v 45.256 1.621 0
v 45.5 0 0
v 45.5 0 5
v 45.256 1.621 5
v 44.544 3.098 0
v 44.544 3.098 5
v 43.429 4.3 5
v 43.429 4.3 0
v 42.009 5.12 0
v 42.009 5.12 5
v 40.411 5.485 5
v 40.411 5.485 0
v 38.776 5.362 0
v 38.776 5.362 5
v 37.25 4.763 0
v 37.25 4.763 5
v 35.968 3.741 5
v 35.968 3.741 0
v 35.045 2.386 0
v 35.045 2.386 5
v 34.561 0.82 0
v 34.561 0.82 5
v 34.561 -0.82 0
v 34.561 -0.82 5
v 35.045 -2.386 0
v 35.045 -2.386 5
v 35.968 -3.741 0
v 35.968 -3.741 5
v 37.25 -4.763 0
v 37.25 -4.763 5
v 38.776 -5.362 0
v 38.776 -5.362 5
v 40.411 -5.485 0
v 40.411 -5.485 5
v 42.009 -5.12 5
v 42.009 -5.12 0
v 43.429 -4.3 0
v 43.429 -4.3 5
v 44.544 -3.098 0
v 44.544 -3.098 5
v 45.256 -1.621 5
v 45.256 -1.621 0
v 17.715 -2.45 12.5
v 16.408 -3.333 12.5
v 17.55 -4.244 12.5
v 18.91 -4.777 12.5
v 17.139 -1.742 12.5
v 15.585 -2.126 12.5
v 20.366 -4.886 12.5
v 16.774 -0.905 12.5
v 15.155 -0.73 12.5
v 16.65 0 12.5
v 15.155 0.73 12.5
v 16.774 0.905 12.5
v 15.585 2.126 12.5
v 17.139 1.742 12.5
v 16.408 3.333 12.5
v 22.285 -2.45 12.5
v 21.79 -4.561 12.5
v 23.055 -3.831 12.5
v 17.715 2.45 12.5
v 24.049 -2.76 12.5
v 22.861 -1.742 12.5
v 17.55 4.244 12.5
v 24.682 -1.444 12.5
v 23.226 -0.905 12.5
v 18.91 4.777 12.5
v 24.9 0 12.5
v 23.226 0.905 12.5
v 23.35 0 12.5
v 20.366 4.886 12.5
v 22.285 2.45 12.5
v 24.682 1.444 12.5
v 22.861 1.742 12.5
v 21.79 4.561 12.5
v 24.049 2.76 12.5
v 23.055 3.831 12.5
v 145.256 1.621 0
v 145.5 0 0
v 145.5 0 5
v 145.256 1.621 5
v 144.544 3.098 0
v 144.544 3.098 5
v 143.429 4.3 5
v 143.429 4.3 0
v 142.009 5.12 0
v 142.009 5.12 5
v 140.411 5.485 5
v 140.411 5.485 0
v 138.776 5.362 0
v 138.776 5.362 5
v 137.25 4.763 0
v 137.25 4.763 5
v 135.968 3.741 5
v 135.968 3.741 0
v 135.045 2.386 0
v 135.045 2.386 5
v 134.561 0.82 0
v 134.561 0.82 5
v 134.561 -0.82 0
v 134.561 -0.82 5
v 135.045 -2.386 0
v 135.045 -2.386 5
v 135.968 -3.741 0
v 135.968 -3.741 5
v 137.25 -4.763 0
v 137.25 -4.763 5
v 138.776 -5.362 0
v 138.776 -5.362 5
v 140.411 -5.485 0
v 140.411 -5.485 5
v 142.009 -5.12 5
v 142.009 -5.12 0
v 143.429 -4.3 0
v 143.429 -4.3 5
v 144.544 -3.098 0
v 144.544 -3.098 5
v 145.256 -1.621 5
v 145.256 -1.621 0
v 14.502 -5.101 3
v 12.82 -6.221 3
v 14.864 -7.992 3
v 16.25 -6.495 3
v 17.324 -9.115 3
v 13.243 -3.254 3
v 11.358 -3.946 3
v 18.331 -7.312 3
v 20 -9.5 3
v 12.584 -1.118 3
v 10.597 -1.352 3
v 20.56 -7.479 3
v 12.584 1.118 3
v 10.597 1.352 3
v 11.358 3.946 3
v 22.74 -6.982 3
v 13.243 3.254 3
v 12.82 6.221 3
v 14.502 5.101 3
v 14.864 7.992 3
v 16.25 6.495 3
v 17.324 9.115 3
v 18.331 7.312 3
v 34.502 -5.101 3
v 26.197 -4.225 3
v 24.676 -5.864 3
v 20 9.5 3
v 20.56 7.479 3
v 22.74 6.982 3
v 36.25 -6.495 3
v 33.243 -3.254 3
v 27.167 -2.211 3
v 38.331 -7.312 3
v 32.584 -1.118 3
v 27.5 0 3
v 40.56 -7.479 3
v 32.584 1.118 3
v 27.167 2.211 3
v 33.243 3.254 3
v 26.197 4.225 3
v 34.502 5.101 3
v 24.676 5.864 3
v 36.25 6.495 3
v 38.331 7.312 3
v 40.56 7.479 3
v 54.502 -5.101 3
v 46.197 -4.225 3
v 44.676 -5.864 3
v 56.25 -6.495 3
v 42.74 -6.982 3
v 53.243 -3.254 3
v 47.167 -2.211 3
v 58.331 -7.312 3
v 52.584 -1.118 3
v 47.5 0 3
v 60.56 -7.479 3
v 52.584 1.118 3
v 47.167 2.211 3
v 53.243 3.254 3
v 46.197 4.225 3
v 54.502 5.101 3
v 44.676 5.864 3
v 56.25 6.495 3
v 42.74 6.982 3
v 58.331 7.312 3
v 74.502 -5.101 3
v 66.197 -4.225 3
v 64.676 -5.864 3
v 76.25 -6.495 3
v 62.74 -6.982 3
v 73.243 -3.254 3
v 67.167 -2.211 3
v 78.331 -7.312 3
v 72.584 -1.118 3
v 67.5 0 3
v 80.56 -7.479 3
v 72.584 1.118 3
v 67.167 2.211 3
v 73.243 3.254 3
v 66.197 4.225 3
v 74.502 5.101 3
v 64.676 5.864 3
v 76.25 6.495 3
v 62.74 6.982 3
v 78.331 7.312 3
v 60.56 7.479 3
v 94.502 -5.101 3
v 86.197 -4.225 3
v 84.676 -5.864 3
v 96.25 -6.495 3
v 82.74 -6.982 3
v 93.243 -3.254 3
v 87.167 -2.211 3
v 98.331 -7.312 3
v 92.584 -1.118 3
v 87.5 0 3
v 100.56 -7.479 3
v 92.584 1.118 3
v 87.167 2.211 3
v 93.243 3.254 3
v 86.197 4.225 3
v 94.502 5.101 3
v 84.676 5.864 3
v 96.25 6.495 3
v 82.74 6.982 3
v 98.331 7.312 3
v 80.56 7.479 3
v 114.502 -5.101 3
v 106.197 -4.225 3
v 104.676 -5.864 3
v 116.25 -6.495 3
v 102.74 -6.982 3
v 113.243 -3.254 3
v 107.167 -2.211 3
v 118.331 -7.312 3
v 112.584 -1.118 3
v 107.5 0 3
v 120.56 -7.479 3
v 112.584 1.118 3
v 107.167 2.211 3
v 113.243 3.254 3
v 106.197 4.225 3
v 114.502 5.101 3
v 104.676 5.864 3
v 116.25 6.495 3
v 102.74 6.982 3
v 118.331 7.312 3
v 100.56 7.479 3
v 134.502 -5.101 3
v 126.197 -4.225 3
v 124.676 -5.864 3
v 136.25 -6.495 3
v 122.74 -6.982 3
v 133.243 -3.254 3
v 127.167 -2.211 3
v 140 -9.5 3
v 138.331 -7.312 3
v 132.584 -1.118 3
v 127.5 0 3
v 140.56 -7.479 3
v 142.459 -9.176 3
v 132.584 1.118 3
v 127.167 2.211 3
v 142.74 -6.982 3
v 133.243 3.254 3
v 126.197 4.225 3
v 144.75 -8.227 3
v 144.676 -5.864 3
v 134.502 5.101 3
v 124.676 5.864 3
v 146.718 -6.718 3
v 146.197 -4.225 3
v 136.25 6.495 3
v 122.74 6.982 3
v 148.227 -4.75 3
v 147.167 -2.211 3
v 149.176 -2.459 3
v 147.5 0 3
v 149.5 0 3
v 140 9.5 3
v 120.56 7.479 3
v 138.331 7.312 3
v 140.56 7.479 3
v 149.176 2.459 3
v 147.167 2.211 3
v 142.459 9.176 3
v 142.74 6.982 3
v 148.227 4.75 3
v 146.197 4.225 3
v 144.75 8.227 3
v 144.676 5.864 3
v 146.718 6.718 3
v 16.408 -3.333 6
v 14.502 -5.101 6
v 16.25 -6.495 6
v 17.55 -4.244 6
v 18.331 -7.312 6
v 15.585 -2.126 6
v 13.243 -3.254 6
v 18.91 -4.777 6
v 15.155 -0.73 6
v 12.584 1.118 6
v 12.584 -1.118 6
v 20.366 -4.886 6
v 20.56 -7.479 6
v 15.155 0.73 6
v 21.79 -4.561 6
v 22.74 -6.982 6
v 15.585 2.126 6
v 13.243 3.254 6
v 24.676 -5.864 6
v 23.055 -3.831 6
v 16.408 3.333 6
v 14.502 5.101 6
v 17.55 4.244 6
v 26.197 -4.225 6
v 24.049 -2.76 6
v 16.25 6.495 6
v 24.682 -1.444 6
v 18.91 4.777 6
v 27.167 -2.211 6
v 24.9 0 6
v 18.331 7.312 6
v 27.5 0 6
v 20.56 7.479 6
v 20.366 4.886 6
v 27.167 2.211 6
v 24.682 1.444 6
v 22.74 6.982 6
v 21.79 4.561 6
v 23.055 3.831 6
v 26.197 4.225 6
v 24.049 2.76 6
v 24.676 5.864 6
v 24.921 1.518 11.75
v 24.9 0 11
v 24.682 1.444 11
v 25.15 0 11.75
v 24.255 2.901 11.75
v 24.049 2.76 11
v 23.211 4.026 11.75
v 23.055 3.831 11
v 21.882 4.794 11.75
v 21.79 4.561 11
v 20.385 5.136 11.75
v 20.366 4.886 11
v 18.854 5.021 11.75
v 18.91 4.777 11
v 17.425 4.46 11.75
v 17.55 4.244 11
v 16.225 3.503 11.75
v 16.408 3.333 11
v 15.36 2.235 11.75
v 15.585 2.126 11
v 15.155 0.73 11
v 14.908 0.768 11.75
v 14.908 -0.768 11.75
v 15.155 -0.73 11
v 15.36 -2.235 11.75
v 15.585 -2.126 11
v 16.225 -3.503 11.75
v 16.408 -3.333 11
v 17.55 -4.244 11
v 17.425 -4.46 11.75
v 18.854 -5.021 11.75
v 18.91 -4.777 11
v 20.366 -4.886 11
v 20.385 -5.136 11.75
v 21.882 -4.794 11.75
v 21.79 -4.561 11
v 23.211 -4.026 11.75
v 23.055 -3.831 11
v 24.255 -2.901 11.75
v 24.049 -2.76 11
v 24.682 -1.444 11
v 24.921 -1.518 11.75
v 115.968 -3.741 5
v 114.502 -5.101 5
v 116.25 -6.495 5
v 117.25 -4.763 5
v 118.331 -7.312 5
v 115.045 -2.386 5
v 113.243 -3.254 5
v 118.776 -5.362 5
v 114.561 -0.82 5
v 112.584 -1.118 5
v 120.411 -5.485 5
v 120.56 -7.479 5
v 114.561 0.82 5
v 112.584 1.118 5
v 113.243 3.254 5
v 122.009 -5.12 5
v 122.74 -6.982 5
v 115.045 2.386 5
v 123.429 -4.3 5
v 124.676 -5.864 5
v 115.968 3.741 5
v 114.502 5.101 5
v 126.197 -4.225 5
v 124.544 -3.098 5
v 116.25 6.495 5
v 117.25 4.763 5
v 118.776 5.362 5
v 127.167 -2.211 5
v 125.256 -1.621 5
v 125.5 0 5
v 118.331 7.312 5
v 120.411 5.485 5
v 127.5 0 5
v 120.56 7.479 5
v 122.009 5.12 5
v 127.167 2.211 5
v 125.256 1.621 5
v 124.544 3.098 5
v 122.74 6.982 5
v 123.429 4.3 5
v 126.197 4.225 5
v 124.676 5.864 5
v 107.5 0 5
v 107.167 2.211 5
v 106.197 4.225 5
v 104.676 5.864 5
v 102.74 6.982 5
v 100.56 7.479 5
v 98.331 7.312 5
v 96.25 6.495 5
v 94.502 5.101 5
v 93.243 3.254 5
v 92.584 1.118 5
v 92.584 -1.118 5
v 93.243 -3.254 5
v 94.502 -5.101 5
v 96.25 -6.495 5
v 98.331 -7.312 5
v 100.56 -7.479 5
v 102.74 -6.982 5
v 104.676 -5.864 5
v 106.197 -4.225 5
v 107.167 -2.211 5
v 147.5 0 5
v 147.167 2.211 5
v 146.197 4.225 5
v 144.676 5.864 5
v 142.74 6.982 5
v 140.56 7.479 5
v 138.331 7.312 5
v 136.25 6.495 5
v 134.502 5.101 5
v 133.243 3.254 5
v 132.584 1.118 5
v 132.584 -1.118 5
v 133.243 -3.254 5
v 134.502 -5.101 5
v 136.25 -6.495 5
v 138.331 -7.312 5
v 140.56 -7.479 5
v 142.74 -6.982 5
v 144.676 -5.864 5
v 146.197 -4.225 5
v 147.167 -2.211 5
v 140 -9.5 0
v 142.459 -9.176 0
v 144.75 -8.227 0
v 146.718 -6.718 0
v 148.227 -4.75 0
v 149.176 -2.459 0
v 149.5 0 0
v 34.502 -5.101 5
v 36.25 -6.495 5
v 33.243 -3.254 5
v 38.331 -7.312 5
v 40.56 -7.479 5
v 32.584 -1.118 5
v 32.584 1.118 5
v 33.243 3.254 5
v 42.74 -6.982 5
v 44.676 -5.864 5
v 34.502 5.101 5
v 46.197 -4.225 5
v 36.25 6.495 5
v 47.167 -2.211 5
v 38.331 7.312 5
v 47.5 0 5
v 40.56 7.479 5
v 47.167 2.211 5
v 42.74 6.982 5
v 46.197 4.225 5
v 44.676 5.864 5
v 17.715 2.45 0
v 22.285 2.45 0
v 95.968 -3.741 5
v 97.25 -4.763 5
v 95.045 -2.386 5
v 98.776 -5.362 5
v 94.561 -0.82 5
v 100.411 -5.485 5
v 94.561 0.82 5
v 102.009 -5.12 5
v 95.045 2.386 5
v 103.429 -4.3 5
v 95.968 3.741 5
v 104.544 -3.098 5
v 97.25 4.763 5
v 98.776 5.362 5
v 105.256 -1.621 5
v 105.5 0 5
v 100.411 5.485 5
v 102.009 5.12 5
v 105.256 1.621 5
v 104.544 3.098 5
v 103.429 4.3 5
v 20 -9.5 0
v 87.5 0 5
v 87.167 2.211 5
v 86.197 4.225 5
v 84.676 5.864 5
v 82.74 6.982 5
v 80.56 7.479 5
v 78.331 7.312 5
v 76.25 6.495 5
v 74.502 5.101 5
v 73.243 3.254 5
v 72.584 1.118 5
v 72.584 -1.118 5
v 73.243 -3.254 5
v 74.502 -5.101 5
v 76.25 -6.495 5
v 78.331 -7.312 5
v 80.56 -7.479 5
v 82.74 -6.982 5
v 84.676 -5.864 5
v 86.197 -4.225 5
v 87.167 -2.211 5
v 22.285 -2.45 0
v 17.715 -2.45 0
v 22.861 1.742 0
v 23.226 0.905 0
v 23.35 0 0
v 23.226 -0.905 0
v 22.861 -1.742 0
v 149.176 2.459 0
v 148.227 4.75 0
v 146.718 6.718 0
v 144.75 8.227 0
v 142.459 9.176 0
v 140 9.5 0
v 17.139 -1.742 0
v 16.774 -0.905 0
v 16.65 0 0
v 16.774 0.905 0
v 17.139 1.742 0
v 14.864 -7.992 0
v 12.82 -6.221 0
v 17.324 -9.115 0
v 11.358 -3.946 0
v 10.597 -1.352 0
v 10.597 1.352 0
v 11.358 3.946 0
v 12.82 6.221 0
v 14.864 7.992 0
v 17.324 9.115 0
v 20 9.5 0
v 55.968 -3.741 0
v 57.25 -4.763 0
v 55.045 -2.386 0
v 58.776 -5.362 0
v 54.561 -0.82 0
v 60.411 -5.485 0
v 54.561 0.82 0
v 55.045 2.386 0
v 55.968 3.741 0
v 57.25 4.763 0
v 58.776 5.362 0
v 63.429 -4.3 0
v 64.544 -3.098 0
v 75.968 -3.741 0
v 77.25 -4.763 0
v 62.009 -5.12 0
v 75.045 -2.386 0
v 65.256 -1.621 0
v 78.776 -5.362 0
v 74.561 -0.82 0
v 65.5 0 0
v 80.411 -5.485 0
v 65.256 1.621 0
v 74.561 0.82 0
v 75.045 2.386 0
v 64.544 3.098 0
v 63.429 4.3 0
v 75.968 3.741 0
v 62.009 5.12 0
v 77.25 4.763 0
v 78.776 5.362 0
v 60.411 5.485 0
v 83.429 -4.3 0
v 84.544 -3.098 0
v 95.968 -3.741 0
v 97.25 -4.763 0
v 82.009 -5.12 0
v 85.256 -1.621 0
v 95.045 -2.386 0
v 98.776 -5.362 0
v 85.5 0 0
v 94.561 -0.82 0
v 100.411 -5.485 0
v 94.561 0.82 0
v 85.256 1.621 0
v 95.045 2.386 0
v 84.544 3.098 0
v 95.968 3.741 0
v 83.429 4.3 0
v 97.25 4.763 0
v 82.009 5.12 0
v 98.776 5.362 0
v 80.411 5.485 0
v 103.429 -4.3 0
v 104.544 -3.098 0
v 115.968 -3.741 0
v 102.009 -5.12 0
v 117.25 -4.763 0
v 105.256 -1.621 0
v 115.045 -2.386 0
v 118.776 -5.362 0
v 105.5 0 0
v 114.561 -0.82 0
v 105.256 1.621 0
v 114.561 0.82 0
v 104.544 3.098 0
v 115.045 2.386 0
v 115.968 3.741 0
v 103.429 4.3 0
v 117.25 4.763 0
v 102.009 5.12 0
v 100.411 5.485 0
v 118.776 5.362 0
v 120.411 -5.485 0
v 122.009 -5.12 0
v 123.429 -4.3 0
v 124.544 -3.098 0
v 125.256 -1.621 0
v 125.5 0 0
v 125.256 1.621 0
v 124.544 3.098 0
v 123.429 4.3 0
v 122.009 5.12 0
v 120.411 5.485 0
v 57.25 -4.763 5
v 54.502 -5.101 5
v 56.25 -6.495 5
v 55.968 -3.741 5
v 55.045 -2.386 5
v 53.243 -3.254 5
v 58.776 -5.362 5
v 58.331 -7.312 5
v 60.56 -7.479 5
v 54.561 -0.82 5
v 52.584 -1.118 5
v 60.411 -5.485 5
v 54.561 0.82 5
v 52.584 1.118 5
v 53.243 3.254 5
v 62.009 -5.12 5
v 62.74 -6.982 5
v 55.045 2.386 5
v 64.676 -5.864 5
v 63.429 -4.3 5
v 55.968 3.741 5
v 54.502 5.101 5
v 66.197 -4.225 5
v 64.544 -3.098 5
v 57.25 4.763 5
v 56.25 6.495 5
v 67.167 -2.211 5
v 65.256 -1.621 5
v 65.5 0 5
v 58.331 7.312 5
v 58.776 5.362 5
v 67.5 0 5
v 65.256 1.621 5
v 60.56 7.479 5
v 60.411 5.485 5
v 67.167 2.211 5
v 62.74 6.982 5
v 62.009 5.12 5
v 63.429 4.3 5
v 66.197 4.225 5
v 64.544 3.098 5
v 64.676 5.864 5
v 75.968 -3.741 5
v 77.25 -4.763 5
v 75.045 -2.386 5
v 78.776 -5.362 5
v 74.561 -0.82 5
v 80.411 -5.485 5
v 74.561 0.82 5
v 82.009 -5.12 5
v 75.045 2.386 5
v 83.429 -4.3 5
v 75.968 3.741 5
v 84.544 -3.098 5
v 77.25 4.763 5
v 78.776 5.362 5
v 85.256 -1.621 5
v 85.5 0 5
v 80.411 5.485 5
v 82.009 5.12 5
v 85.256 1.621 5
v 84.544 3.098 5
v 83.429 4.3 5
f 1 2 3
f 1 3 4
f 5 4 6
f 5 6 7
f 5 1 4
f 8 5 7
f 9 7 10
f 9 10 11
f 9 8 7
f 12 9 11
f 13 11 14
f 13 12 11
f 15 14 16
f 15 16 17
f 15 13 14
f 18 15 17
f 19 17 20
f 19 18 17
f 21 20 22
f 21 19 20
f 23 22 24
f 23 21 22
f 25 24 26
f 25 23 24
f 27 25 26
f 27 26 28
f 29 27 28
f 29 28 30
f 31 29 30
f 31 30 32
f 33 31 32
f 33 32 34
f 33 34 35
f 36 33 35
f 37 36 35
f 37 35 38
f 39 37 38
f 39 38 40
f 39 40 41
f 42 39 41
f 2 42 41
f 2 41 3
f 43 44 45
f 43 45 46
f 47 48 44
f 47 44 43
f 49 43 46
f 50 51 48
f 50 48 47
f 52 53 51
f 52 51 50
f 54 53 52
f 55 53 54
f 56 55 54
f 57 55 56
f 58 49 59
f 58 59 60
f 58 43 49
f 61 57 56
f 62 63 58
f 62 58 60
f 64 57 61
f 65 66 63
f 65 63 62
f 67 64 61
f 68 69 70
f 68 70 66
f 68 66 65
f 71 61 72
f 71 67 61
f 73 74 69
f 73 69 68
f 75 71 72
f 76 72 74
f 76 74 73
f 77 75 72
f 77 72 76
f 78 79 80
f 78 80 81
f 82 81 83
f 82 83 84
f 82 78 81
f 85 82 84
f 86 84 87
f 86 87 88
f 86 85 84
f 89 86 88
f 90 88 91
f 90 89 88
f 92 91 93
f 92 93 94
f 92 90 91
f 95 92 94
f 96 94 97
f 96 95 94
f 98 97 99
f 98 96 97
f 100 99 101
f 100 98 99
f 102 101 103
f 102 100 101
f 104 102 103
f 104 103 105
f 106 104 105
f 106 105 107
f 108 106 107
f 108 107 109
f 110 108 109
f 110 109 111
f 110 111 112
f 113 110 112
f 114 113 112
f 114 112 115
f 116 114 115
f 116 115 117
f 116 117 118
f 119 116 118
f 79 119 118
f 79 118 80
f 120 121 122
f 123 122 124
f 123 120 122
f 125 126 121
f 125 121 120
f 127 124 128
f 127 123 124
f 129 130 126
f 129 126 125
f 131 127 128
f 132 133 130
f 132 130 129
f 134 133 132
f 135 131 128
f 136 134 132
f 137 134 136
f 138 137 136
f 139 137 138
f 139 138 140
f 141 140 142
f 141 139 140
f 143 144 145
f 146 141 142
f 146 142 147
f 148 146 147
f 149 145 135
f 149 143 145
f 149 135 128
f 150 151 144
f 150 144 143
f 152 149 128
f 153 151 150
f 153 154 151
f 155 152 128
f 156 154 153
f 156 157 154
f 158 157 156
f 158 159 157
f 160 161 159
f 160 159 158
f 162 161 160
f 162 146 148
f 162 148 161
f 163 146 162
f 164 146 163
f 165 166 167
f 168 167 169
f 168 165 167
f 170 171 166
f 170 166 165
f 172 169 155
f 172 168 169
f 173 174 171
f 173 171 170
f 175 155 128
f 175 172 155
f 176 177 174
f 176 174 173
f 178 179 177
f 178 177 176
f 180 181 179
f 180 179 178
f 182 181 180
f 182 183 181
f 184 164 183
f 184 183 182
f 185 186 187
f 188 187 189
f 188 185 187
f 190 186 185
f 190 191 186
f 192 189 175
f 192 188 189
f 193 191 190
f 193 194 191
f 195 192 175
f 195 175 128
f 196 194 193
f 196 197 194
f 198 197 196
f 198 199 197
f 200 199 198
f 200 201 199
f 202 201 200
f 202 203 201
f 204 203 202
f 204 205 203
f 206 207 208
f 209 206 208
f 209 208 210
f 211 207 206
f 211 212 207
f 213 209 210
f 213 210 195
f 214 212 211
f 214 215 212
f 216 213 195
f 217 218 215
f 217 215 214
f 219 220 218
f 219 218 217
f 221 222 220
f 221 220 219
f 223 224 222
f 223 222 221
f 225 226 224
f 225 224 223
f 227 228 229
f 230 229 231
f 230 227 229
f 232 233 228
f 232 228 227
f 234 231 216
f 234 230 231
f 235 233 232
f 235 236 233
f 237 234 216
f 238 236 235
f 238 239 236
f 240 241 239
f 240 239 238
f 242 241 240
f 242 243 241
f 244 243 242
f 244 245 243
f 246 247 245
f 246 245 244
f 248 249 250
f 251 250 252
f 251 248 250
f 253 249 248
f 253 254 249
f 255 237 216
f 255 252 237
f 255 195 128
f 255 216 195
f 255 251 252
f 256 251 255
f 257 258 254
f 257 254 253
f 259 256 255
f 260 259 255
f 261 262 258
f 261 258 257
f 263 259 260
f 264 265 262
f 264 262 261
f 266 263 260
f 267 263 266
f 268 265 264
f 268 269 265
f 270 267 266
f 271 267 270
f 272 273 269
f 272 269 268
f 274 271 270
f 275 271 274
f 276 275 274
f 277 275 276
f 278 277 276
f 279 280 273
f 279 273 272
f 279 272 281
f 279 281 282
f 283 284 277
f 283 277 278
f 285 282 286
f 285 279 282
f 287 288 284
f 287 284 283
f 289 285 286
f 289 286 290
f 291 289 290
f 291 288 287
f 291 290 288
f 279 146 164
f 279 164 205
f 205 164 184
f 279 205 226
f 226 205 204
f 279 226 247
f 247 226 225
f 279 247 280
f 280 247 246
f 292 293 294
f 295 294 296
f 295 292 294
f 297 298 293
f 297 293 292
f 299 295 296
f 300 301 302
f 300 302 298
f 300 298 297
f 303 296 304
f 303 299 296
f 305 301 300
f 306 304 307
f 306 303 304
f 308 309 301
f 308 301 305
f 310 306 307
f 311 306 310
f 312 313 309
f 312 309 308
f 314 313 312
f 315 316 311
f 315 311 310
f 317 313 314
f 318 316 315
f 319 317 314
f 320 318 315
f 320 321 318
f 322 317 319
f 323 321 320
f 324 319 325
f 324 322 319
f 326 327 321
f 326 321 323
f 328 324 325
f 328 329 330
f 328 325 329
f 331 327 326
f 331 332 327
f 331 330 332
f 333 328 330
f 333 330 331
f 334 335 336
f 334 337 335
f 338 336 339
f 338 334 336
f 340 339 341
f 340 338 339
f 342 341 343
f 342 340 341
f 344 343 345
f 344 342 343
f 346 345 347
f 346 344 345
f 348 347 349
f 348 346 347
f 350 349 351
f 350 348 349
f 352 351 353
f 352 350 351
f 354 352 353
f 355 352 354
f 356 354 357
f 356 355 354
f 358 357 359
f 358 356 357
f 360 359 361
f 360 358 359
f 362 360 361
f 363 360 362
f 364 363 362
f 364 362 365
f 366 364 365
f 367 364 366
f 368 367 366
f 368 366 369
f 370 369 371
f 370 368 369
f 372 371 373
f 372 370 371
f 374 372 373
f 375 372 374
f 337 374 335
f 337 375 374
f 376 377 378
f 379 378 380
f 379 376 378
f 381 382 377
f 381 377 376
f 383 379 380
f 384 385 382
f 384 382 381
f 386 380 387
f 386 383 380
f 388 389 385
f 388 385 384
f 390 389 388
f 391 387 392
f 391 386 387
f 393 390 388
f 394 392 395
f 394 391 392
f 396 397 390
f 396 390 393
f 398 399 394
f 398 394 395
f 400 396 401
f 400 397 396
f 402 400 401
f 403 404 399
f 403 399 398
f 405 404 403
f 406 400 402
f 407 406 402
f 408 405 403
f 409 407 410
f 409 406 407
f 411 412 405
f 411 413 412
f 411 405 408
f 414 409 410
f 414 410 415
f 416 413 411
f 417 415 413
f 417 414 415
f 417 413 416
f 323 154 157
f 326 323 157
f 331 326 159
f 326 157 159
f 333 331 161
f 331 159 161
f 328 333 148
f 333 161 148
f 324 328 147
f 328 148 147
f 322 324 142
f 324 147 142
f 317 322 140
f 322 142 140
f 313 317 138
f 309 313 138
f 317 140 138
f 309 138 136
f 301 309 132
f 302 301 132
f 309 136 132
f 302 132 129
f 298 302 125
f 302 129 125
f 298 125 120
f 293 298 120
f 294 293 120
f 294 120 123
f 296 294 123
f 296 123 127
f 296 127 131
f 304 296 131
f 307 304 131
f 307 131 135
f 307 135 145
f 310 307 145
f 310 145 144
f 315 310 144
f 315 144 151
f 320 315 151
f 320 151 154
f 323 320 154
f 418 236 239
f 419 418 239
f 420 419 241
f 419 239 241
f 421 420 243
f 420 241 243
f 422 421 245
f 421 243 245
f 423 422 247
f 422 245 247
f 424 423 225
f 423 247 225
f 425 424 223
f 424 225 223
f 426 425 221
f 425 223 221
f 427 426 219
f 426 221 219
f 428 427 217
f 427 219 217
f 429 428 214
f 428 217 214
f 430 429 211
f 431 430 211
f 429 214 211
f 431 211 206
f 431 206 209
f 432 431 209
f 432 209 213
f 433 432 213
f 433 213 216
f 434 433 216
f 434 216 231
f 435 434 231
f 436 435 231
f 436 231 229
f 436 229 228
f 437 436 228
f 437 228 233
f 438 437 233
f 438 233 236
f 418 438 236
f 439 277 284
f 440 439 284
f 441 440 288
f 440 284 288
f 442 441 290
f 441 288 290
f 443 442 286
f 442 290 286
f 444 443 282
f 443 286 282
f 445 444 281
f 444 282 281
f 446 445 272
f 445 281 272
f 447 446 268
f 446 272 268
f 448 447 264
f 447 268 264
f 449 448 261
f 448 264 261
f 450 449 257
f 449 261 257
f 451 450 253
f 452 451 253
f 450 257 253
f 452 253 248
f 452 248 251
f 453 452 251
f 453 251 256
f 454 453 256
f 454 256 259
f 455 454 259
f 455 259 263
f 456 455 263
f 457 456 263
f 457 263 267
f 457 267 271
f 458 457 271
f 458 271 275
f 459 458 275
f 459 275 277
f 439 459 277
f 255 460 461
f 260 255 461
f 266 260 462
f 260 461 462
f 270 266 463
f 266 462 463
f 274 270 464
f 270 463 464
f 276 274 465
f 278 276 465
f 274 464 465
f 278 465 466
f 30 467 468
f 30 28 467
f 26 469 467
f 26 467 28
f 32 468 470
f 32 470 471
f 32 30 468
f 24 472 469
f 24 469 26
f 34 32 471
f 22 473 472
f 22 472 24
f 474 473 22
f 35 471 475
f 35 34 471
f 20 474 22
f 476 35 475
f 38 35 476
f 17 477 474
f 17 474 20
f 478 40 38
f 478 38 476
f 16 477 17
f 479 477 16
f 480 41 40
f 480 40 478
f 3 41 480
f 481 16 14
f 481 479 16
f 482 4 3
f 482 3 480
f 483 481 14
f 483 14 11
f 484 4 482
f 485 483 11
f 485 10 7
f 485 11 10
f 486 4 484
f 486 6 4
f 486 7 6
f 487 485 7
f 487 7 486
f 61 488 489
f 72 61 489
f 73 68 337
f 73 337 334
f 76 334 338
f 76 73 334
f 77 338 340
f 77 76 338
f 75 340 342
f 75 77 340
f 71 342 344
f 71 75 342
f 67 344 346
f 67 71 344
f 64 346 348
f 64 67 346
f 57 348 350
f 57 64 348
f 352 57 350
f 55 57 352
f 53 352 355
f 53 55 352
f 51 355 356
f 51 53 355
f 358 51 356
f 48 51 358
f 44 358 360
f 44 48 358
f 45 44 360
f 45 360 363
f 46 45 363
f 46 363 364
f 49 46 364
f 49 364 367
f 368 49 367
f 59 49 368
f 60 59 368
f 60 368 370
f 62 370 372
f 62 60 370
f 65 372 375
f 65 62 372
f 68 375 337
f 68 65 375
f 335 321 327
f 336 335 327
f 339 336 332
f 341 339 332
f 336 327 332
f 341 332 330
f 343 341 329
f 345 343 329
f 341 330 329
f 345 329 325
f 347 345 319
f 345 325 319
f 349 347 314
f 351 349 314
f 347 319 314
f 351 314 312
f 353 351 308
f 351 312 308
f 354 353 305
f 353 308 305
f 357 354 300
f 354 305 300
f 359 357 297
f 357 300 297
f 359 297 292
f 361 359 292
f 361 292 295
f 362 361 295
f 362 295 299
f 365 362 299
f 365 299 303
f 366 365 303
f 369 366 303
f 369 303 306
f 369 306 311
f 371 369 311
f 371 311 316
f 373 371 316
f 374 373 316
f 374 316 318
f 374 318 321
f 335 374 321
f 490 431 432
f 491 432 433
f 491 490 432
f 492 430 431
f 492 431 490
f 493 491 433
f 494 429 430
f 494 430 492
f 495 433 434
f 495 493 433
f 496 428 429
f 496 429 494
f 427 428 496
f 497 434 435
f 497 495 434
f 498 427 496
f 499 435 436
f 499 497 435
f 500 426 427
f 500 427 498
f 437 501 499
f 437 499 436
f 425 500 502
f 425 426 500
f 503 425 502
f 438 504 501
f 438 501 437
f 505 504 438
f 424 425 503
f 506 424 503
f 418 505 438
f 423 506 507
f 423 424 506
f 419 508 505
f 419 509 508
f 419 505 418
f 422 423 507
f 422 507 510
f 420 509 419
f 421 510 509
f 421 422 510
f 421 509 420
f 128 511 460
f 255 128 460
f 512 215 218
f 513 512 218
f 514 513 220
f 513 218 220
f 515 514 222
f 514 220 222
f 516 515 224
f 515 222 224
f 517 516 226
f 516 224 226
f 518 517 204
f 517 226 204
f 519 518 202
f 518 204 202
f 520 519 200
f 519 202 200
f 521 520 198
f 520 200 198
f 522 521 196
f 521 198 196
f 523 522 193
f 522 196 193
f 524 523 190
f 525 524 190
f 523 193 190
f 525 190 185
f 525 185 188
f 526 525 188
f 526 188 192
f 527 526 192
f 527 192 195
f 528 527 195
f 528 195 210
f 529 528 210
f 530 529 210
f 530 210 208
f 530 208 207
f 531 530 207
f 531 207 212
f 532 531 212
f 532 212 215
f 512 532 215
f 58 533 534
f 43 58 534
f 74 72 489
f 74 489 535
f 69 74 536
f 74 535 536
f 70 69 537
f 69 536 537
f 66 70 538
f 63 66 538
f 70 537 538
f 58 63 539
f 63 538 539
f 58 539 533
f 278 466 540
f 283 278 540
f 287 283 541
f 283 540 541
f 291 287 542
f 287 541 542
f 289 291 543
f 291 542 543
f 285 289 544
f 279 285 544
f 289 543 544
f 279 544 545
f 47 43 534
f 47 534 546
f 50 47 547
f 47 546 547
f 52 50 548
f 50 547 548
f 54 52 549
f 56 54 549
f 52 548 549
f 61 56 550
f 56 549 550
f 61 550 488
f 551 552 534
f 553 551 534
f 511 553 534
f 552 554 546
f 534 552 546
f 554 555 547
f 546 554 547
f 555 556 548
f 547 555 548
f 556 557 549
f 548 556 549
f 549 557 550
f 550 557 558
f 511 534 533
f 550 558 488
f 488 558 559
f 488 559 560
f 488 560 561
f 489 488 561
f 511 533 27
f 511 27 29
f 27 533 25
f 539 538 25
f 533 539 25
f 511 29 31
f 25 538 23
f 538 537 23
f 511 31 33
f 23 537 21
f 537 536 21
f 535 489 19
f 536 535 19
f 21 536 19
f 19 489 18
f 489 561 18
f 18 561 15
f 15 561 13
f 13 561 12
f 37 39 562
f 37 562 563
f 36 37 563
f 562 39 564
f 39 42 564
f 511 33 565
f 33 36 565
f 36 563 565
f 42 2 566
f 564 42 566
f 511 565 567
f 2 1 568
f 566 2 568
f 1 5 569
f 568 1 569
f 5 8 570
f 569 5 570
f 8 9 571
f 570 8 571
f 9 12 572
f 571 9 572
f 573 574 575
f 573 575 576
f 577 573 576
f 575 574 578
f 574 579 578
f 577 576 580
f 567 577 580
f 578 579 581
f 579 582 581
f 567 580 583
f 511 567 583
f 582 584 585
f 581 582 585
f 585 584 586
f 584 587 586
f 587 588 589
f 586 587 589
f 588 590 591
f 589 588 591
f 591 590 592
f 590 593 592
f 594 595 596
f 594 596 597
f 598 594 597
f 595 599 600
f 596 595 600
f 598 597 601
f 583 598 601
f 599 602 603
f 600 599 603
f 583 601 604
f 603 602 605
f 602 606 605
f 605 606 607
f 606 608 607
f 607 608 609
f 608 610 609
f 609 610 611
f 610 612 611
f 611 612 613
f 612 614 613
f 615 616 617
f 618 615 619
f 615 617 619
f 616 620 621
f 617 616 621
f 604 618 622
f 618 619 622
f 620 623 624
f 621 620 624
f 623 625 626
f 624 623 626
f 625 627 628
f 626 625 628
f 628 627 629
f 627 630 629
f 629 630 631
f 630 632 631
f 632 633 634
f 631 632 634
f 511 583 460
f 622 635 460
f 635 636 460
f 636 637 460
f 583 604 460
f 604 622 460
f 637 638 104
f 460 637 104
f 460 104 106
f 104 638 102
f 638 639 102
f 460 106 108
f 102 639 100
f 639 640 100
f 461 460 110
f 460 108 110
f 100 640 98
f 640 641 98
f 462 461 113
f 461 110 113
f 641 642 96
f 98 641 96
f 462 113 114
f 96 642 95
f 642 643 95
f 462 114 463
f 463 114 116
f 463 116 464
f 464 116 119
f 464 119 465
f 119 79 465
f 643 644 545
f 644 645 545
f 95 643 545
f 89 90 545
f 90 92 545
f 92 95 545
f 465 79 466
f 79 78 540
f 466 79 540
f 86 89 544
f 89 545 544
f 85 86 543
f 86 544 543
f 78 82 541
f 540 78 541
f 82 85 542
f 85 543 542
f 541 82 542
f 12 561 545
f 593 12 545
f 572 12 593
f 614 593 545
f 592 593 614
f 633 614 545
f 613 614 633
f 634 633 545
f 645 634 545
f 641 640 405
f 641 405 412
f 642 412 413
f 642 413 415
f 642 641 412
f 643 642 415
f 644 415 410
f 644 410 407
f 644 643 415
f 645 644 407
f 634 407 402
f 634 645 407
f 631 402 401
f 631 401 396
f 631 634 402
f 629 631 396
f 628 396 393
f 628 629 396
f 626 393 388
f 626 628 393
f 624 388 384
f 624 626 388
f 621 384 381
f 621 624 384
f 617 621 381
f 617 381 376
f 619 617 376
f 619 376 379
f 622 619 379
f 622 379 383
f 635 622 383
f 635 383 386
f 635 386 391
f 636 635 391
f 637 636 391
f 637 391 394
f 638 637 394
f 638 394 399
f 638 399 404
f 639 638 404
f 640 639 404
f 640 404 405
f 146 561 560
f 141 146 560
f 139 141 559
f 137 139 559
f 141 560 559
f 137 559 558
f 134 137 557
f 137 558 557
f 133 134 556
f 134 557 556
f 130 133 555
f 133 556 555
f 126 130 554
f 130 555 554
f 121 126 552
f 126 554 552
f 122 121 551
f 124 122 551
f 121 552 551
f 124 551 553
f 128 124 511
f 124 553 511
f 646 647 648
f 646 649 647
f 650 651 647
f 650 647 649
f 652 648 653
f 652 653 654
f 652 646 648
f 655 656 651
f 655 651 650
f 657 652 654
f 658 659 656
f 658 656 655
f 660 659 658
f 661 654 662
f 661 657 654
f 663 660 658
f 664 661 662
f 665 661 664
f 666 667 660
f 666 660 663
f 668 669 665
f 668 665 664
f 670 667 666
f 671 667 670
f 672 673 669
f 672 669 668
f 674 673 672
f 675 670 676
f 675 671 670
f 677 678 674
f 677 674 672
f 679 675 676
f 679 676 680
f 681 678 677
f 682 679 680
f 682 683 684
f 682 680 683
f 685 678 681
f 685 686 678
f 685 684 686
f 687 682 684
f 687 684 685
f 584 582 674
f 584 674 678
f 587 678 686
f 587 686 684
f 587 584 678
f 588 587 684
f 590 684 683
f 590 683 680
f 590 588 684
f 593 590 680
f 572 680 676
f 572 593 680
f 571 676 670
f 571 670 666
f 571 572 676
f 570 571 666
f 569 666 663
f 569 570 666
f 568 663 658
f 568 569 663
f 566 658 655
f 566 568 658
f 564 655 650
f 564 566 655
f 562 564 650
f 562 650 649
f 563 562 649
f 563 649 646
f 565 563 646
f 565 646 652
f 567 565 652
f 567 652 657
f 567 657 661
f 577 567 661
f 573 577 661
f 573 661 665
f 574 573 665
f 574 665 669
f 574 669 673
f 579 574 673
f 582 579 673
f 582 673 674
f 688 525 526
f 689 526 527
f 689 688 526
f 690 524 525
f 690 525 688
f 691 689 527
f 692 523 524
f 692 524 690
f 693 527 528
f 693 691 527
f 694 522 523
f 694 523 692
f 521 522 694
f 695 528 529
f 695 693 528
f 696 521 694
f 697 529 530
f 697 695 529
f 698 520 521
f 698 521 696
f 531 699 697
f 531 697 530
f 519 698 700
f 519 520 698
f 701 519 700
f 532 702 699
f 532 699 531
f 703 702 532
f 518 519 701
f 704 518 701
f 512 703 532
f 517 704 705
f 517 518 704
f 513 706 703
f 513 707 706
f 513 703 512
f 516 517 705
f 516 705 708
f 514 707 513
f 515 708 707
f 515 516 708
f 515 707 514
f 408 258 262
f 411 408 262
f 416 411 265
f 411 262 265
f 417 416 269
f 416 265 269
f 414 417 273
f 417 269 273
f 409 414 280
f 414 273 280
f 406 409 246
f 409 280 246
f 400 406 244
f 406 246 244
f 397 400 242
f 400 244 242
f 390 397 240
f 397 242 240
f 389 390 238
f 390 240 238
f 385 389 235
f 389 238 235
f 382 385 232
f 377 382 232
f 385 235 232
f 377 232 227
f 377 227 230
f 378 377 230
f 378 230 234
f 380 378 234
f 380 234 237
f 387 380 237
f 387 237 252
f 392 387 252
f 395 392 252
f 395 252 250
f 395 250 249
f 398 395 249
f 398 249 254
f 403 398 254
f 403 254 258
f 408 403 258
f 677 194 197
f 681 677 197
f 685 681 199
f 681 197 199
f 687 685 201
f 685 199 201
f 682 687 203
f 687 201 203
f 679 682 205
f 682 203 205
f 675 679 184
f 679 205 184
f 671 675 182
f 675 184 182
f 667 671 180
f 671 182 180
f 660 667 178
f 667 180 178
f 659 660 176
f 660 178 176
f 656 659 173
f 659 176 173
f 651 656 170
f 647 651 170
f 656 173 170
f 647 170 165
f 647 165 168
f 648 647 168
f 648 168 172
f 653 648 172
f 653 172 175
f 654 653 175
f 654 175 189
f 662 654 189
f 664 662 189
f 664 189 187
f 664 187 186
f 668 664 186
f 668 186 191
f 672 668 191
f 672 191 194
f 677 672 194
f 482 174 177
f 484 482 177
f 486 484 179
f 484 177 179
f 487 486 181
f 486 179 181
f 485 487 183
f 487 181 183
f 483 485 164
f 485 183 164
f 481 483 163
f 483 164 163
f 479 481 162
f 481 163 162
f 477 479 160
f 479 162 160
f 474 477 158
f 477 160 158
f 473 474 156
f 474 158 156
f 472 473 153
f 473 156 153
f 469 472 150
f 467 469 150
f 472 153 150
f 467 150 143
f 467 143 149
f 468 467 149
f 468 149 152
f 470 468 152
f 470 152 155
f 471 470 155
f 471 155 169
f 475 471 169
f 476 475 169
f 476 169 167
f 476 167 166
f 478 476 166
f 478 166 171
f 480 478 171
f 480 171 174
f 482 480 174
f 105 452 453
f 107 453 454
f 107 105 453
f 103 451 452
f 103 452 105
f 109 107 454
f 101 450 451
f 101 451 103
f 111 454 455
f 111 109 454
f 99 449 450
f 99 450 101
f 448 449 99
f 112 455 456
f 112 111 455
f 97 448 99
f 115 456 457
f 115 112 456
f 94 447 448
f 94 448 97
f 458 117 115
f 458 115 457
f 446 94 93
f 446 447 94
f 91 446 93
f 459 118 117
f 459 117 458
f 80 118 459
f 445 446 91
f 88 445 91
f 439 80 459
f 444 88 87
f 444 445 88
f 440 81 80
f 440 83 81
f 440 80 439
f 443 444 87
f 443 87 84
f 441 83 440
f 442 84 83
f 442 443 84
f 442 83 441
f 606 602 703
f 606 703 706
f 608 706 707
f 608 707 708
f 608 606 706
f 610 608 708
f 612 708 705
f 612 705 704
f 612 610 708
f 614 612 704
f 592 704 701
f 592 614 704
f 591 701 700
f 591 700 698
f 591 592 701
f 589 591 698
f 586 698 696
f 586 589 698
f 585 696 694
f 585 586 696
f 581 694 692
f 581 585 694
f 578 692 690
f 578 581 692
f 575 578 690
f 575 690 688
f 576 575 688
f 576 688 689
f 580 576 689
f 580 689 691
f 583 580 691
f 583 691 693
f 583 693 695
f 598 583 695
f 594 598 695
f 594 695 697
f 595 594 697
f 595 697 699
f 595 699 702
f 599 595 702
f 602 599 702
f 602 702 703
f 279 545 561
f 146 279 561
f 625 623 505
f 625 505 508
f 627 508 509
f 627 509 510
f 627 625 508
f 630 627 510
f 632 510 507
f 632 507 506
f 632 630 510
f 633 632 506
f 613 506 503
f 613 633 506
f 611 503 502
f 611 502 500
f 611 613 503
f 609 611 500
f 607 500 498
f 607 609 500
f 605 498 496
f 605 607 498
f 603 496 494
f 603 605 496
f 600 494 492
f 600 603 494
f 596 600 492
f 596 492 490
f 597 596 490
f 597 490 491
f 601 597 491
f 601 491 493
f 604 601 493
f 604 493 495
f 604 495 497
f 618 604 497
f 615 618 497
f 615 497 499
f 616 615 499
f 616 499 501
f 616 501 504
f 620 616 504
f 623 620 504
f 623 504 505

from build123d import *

# Parameters (mm, degrees)
F2_R     = 7.5
F2_R_2   = 5.5
F3_DEPTH = 3
F4_DEPTH = 5
F5_DEPTH = 5
F2_R_3   = 4.9
F6_DEPTH = 6
F7_DEPTH = 12.5


# Not quite as in the source:
# - a feature names something its author has since deleted; it is built from what else it names


with BuildPart() as f3:
    # F2 (on Top) → F3 (new body)
    with BuildSketch(Plane.XY):
        with BuildLine():
            Line((140, 9.5), (20, 9.5))
            ThreePointArc((20, 9.5), (10.5, 0), (20, -9.5))
            Line((20, -9.5), (140, -9.5))
            ThreePointArc((140, -9.5), (146.7175144213, -6.7175144213), (149.5, 0))
            ThreePointArc((149.5, 0), (146.7175144213, 6.7175144213), (140, 9.5))
        make_face()
        with Locations((20, 0)):
            Circle(F2_R, mode=Mode.SUBTRACT)
        with Locations((40, 0)):
            Circle(F2_R, mode=Mode.SUBTRACT)
        with Locations((60, 0)):
            Circle(F2_R, mode=Mode.SUBTRACT)
        with Locations((80, 0)):
            Circle(F2_R, mode=Mode.SUBTRACT)
        with Locations((100, 0)):
            Circle(F2_R, mode=Mode.SUBTRACT)
        with Locations((120, 0)):
            Circle(F2_R, mode=Mode.SUBTRACT)
        with Locations((140, 0)):
            Circle(F2_R, mode=Mode.SUBTRACT)
        with Locations((20, 0)):
            Circle(F2_R)
        with Locations((20, 0)):
            Circle(F2_R_2, mode=Mode.SUBTRACT)
        with Locations((40, 0)):
            Circle(F2_R)
        with Locations((40, 0)):
            Circle(F2_R_2, mode=Mode.SUBTRACT)
        with Locations((60, 0)):
            Circle(F2_R)
        with Locations((60, 0)):
            Circle(F2_R_2, mode=Mode.SUBTRACT)
        with Locations((80, 0)):
            Circle(F2_R)
        with Locations((80, 0)):
            Circle(F2_R_2, mode=Mode.SUBTRACT)
        with Locations((100, 0)):
            Circle(F2_R)
        with Locations((100, 0)):
            Circle(F2_R_2, mode=Mode.SUBTRACT)
        with Locations((120, 0)):
            Circle(F2_R)
        with Locations((120, 0)):
            Circle(F2_R_2, mode=Mode.SUBTRACT)
        with Locations((140, 0)):
            Circle(F2_R)
        with Locations((140, 0)):
            Circle(F2_R_2, mode=Mode.SUBTRACT)
    extrude(amount=F3_DEPTH)

    # F2 (on Top) → F4 (join)
    with BuildSketch(Plane.XY):
        with Locations((20, 0)):
            Circle(F2_R)
        with Locations((20, 0)):
            Circle(F2_R_2, mode=Mode.SUBTRACT)
        with Locations((40, 0)):
            Circle(F2_R)
        with Locations((40, 0)):
            Circle(F2_R_2, mode=Mode.SUBTRACT)
        with Locations((60, 0)):
            Circle(F2_R)
        with Locations((60, 0)):
            Circle(F2_R_2, mode=Mode.SUBTRACT)
        with Locations((80, 0)):
            Circle(F2_R)
        with Locations((80, 0)):
            Circle(F2_R_2, mode=Mode.SUBTRACT)
        with Locations((100, 0)):
            Circle(F2_R)
        with Locations((100, 0)):
            Circle(F2_R_2, mode=Mode.SUBTRACT)
        with Locations((120, 0)):
            Circle(F2_R)
        with Locations((120, 0)):
            Circle(F2_R_2, mode=Mode.SUBTRACT)
        with Locations((140, 0)):
            Circle(F2_R)
        with Locations((140, 0)):
            Circle(F2_R_2, mode=Mode.SUBTRACT)
    extrude(amount=F4_DEPTH)

    # F2 (on Top) → F5 (join)
    with BuildSketch(Plane.XY):
        with Locations((140, 0)):
            Circle(F2_R)
        with Locations((140, 0)):
            Circle(F2_R_2, mode=Mode.SUBTRACT)
    extrude(amount=F5_DEPTH)

    # F2 (on Top) → F6 (join)
    with BuildSketch(Plane.XY):
        with Locations((20, 0)):
            Circle(F2_R)
        with Locations((20, 0)):
            Circle(F2_R_2, mode=Mode.SUBTRACT)
        with Locations((20, 0)):
            Circle(F2_R_2)
        with Locations((20, 0)):
            Circle(F2_R_3, mode=Mode.SUBTRACT)
    extrude(amount=F6_DEPTH)

    # F2 (on Top) → F7 (join)
    with BuildSketch(Plane.XY):
        with Locations((20, 0)):
            Circle(F2_R_3)
        with BuildLine():
            Line((22.2847319318, -2.45), (20, -2.45))
            Line((20, -2.45), (17.7152680682, -2.45))
            ThreePointArc((17.7152680682, -2.45), (16.65, 0), (17.7152680682, 2.45))
            Line((17.7152680682, 2.45), (20, 2.45))
            Line((20, 2.45), (22.2847319318, 2.45))
            ThreePointArc((22.2847319318, 2.45), (23.35, 0), (22.2847319318, -2.45))
        make_face(mode=Mode.SUBTRACT)
    extrude(amount=F7_DEPTH)

    # F9 (on plane+point) → F10 (revolve)
    with BuildSketch(Plane.XZ):
        Polygon((25.15, 11.75), (24.9, 12.5), (24.9, 11), align=None)
    revolve(axis=Axis((20, 0, 6.25), (0, 0, 1)))


solid = f3.part
